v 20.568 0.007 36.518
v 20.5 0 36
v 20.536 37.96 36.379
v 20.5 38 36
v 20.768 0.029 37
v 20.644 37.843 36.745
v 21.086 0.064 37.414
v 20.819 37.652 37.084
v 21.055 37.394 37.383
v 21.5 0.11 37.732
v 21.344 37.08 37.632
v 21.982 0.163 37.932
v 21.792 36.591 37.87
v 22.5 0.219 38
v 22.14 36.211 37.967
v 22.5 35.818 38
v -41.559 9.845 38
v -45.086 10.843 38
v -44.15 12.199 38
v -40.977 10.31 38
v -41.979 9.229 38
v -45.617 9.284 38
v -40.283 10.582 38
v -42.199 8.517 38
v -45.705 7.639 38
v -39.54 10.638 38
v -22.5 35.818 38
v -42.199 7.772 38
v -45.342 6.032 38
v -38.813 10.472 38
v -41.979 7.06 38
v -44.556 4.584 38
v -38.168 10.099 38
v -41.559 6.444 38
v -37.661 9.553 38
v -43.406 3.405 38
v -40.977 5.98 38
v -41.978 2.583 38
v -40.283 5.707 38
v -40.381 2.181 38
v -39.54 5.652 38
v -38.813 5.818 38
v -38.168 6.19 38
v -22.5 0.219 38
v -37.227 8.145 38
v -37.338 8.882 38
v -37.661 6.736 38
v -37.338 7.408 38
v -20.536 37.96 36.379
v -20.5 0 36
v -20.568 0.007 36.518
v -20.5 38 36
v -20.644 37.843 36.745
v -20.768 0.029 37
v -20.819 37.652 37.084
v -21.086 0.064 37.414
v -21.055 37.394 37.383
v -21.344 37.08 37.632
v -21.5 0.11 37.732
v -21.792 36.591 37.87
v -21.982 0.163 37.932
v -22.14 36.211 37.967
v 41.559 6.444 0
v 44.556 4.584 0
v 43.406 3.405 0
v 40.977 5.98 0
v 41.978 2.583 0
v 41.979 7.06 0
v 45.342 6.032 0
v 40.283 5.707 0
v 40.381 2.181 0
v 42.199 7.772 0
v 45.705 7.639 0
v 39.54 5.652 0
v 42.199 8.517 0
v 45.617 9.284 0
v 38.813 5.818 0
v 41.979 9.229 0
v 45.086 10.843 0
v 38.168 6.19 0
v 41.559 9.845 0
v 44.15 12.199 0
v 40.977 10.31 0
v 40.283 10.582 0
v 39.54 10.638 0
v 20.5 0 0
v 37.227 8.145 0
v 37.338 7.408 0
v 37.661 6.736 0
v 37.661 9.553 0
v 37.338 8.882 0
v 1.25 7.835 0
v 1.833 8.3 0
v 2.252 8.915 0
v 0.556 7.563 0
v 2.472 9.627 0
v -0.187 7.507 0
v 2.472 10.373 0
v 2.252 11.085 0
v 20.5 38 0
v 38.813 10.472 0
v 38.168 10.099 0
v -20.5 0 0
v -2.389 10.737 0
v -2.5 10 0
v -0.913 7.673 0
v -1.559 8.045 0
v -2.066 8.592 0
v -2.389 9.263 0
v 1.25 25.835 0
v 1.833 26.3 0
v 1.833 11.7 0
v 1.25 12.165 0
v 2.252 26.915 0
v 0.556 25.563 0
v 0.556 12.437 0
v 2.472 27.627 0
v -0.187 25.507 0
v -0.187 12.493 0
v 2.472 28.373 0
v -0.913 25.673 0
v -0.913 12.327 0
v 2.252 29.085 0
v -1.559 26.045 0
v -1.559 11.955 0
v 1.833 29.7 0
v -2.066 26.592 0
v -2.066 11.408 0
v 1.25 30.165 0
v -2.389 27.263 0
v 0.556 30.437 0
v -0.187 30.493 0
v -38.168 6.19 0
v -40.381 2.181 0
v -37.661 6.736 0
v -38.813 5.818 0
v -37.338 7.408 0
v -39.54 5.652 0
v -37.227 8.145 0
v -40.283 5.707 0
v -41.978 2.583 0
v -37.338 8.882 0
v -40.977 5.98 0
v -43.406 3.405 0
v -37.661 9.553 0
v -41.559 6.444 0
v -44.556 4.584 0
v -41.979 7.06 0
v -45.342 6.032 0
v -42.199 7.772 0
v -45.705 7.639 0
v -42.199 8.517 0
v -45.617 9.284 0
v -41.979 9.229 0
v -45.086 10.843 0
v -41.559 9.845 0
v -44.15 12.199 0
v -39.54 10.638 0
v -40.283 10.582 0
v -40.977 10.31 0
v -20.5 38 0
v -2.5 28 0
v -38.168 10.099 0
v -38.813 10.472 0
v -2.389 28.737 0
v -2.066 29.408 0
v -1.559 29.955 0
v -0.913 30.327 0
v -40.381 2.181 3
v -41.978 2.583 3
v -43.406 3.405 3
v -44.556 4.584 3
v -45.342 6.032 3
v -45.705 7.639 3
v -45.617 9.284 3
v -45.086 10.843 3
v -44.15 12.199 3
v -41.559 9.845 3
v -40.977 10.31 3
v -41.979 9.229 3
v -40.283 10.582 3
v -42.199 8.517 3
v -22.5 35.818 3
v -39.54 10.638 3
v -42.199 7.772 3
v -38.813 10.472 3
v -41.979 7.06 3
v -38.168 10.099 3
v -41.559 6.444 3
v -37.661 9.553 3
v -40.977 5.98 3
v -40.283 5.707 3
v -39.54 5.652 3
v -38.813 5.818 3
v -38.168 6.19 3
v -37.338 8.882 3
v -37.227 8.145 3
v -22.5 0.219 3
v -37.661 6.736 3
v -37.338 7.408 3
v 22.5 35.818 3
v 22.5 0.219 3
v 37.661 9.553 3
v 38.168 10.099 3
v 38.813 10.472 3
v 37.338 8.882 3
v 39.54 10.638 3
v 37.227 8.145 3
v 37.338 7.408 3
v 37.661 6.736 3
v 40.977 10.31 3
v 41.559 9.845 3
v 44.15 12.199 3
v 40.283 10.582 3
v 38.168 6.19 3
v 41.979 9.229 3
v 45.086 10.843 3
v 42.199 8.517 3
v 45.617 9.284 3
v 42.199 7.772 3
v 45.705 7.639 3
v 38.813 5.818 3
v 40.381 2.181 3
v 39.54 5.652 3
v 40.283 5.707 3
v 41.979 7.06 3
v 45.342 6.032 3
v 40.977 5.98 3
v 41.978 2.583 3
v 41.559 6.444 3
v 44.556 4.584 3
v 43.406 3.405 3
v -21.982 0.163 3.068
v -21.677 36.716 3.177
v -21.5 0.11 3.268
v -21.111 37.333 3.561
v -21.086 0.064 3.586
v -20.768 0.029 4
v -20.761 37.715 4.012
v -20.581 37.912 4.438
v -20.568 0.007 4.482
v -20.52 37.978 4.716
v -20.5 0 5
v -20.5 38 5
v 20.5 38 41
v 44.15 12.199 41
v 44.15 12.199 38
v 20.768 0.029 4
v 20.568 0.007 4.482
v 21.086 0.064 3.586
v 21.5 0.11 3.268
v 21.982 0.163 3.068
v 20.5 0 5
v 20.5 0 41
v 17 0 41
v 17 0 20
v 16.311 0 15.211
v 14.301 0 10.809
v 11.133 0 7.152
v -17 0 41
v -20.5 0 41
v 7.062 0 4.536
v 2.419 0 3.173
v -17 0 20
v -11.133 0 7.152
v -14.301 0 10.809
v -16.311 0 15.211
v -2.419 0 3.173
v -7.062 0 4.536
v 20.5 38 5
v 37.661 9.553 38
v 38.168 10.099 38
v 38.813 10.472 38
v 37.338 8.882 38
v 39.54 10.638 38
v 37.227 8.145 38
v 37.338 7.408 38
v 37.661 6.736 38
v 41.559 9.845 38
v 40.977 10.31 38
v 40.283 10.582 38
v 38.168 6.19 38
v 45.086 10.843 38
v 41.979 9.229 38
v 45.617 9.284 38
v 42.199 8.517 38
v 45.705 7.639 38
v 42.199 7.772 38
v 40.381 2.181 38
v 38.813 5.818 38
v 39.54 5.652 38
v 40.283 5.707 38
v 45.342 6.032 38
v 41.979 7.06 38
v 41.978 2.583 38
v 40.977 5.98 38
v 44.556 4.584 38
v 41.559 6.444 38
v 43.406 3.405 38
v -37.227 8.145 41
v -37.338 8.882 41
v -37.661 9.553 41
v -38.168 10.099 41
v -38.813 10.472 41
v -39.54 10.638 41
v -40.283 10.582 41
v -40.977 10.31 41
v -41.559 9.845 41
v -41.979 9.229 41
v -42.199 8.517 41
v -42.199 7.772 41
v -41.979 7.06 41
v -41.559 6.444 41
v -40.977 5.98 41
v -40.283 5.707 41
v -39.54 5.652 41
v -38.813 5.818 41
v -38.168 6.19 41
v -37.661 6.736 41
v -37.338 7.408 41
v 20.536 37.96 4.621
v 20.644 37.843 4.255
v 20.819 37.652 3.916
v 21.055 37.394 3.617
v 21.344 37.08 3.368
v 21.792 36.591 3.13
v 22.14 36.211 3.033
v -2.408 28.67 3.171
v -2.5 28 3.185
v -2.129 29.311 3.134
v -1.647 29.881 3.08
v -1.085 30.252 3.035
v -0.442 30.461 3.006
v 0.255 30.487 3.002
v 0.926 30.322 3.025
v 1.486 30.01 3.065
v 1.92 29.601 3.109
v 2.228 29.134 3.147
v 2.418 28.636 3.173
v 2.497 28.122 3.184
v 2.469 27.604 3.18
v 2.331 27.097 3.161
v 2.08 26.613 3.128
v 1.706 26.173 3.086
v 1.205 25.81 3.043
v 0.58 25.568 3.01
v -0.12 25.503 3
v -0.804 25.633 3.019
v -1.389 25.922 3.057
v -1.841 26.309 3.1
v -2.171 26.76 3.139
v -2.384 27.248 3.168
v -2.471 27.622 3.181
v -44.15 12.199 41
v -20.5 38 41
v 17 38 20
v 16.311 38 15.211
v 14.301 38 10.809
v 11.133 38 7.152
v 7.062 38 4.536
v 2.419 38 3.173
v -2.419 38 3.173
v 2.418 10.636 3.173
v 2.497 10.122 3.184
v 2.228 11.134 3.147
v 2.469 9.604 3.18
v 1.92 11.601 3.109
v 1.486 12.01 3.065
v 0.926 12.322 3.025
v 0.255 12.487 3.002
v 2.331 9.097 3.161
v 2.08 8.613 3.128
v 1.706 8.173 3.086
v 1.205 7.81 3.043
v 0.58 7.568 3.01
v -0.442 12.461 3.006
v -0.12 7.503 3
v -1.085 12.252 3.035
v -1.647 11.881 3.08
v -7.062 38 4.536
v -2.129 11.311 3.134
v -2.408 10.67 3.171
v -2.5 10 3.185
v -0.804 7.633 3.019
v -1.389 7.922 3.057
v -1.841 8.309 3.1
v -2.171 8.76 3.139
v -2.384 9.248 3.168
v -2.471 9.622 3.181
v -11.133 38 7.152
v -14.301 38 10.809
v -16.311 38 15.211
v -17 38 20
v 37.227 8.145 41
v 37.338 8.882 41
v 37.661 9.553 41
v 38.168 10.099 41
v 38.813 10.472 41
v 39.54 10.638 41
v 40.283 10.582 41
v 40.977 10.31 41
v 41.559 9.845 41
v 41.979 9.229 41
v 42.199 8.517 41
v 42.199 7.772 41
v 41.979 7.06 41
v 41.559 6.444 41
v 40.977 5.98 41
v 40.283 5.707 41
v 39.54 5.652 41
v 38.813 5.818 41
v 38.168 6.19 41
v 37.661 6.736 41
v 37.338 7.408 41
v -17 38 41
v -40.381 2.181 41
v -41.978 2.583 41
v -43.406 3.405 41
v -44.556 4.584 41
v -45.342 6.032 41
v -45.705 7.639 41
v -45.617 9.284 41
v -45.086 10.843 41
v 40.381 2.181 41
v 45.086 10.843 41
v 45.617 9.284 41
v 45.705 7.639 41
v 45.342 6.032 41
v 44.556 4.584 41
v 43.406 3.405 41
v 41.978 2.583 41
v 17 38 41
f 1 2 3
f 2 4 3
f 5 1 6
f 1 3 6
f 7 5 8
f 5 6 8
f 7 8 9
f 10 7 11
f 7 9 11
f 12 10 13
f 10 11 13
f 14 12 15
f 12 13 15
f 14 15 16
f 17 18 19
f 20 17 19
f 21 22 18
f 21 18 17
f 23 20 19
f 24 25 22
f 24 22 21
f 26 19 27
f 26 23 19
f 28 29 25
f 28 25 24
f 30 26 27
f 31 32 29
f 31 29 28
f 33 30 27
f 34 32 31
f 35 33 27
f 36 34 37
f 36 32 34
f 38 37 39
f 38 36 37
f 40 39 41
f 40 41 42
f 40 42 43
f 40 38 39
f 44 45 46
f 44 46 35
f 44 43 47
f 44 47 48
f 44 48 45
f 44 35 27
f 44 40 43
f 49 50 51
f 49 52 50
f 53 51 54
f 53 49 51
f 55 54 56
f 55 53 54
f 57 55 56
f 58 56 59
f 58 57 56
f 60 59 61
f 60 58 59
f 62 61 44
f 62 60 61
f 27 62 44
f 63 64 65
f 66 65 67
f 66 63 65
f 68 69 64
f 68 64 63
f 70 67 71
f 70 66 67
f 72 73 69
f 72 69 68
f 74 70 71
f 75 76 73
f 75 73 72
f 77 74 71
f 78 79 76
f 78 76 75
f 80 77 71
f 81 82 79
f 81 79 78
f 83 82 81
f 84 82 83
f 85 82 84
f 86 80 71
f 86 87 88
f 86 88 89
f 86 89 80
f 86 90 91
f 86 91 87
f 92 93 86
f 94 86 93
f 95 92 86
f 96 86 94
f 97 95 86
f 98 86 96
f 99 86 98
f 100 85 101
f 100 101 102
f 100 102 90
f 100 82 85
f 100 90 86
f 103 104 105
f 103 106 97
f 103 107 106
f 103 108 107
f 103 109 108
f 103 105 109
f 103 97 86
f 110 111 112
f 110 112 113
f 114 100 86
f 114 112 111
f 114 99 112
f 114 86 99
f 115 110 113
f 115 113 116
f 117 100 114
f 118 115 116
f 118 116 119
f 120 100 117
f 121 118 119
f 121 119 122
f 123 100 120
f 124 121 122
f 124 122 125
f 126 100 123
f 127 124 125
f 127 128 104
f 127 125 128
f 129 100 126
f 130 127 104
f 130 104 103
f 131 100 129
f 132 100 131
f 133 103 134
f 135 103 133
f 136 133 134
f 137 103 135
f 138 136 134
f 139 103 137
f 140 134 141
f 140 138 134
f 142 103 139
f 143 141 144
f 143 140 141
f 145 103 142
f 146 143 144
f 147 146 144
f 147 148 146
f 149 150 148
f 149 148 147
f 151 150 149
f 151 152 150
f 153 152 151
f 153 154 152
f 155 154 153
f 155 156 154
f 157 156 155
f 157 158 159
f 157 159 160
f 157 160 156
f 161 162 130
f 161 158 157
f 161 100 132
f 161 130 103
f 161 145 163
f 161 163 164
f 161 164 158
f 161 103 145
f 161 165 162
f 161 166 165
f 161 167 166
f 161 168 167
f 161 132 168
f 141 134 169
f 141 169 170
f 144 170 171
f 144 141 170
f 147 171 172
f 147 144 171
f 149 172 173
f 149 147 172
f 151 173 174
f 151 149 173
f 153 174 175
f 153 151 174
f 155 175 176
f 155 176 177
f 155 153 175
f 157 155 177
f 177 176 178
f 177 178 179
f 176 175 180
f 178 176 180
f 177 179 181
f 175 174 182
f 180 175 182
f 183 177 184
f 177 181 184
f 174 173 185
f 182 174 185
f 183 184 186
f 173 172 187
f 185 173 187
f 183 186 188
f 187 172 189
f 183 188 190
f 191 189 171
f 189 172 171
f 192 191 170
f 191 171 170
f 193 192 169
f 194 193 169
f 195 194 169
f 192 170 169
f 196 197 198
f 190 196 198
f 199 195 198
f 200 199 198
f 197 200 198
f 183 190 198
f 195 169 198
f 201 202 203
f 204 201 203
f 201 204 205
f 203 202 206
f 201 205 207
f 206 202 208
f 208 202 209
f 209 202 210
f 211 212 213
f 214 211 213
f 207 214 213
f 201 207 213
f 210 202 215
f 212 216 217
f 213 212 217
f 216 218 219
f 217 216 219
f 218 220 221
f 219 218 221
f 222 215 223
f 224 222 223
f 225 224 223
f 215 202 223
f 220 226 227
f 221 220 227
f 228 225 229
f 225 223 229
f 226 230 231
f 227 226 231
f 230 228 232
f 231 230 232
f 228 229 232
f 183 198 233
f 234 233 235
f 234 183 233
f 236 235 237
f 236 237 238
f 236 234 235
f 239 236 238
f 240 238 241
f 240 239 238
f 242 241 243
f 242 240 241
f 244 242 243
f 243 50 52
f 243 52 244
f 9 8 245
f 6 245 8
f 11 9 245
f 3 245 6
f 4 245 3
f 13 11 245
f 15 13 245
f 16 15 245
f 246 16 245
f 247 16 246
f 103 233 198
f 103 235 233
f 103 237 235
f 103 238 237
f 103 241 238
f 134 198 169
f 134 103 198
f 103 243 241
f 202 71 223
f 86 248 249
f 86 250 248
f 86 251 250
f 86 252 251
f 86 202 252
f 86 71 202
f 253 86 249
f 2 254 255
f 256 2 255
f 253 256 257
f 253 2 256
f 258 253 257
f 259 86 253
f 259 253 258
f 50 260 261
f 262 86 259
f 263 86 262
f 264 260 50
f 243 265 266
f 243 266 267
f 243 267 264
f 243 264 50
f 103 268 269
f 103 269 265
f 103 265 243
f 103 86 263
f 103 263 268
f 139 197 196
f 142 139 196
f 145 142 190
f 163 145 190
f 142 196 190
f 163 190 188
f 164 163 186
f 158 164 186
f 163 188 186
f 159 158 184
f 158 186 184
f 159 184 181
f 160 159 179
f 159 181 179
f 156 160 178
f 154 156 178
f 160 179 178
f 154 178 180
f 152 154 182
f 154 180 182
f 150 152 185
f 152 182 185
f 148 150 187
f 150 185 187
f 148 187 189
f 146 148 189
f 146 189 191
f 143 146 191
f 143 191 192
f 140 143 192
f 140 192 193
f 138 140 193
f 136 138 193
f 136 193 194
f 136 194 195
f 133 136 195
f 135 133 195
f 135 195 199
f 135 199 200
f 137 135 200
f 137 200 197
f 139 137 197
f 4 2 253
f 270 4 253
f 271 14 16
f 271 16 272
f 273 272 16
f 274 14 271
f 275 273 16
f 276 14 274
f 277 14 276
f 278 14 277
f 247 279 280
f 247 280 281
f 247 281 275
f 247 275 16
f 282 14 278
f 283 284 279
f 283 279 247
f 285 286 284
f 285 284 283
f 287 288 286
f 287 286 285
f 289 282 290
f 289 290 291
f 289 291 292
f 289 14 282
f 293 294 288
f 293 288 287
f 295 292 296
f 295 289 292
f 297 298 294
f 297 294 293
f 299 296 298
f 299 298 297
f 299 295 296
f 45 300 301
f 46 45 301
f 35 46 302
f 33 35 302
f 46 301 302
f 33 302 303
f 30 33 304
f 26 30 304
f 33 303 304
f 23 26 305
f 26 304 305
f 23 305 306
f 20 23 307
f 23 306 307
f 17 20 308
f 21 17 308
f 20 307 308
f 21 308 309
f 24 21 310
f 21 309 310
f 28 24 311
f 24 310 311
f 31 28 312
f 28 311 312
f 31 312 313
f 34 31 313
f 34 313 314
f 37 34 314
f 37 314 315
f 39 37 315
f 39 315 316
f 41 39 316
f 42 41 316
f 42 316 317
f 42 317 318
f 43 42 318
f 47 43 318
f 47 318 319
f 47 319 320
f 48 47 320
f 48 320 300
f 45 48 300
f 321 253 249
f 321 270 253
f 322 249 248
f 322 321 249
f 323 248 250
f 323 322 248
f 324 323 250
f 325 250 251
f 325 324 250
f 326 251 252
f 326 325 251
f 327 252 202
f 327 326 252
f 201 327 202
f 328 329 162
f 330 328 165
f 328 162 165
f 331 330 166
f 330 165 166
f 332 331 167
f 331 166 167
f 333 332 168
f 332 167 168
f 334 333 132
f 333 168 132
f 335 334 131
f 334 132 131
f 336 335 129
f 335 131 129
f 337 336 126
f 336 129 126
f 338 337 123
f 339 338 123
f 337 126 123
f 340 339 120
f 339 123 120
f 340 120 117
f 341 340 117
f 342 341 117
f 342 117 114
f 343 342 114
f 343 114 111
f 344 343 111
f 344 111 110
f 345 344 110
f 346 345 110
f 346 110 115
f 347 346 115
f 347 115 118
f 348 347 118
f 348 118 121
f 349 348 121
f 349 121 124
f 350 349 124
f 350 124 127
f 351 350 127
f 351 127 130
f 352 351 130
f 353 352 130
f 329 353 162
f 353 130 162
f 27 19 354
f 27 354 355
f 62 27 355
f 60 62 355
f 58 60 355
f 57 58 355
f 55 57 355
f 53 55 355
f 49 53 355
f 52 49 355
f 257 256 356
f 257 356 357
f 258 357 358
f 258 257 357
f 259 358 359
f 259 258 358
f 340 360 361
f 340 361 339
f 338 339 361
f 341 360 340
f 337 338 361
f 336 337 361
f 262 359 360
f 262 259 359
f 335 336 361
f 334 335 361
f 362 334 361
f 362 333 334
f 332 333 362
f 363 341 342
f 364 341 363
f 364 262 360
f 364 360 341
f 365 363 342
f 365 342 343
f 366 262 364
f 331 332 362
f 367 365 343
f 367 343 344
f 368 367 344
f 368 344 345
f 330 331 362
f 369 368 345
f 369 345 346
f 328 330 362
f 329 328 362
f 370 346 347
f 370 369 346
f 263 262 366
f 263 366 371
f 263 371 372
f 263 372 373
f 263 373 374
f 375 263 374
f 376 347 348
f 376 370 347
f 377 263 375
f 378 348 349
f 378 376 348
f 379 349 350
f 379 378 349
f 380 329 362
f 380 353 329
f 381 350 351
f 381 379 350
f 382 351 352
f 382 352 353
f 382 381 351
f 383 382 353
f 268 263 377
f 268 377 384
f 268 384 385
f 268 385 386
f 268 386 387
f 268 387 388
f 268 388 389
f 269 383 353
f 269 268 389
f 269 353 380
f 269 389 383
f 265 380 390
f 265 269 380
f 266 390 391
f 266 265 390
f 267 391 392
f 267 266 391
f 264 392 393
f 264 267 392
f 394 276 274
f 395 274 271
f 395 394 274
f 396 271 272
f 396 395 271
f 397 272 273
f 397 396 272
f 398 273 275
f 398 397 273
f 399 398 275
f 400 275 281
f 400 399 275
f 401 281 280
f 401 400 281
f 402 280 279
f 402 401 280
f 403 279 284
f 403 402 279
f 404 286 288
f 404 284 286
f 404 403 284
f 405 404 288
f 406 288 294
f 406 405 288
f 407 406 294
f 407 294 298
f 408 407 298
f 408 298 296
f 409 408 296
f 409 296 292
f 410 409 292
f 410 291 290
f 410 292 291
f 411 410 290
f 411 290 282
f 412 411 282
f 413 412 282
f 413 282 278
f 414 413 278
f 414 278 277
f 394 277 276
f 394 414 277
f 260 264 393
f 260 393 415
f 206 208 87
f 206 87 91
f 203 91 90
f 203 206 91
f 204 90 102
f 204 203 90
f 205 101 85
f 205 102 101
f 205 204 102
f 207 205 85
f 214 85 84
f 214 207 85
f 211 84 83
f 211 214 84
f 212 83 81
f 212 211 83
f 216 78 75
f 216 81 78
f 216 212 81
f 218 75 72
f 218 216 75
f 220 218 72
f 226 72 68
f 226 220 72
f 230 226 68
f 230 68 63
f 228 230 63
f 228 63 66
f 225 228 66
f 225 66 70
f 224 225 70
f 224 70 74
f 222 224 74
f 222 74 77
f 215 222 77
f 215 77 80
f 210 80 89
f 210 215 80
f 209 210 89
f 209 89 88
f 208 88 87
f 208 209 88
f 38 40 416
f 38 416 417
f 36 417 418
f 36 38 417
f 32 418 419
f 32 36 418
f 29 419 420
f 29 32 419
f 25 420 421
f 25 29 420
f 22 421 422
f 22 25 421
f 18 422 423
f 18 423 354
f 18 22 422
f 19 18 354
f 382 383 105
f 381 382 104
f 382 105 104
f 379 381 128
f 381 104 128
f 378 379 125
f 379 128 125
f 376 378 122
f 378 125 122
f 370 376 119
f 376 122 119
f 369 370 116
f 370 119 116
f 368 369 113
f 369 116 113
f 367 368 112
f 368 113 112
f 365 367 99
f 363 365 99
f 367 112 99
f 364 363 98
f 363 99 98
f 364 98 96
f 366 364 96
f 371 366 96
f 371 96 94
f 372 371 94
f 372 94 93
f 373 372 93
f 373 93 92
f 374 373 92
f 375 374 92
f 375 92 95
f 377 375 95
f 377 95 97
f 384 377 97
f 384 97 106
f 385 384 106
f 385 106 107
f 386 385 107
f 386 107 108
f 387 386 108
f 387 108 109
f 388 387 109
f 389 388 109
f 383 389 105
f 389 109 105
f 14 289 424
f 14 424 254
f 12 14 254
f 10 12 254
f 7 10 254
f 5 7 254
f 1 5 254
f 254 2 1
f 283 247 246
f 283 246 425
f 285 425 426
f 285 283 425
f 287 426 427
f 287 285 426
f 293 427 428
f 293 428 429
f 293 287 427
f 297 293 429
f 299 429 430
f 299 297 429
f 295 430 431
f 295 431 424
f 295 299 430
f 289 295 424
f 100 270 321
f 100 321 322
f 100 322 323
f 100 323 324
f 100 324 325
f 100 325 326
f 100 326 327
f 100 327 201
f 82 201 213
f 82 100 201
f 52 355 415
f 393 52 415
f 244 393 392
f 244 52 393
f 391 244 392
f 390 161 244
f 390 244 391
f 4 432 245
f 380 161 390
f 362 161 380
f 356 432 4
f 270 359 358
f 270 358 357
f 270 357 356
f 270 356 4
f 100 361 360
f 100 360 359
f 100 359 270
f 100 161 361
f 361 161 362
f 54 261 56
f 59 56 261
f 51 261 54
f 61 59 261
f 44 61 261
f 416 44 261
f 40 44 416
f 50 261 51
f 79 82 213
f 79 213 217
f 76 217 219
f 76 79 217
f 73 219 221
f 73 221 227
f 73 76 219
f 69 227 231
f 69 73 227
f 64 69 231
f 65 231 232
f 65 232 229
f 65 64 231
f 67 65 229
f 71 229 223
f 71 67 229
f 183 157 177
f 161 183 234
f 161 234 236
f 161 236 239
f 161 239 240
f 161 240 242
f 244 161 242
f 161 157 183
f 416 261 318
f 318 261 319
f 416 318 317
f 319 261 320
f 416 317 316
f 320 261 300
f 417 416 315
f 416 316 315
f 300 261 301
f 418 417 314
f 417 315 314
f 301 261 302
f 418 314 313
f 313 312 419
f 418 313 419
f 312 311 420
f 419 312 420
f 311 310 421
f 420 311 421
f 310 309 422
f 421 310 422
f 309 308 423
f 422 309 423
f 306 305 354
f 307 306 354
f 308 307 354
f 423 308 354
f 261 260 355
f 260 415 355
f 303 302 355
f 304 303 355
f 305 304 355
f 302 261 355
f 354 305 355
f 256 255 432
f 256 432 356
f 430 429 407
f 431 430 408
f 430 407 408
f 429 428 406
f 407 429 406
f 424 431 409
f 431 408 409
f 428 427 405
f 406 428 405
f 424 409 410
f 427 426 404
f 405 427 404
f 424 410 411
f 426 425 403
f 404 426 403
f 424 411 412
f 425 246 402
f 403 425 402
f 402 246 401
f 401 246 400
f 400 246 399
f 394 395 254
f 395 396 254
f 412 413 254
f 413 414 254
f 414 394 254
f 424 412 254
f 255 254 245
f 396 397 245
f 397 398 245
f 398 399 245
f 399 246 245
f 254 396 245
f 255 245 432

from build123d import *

# Parameters (mm, degrees)
BOSS_EXTRUDE1_DEPTH     = 41
SKETCH3_W               = 25.226628976
SKETCH3_H               = 35
CUT_EXTRUDE2_DEPTH      = 39
CUT_EXTRUDE2_DEPTH_BACK = 1
CUT_EXTRUDE3_DEPTH      = 39
SKETCH5_R               = 2.5
CUT_EXTRUDE4_DEPTH      = 42
SKETCH6_R               = 2.5
CUT_EXTRUDE5_DEPTH      = 42.0000001
FILLET1_R               = 2


with BuildPart() as part:
    # Sketch1 → Boss-Extrude1 (new body)
    with BuildSketch(Plane.XY):
        with BuildLine():
            Line((-20.5, 0), (-40.380779843, 2.180502889))
            ThreePointArc((-40.380779843, 2.180502889), (-45.342396797, 6.03211956), (-44.149663567, 12.198964882))
            Line((-44.149663567, 12.198964882), (-20.5, 38))
            Line((-20.5, 38), (20.5, 38))
            Line((20.5, 38), (44.149663567, 12.198964882))
            ThreePointArc((44.149663567, 12.198964882), (45.342396797, 6.03211956), (40.380779843, 2.180502889))
            Line((40.380779843, 2.180502889), (20.5, 0))
            Line((20.5, 0), (-20.5, 0))
        make_face()
    extrude(amount=BOSS_EXTRUDE1_DEPTH)

    # Sketch3 → Cut-Extrude2 (cut, two sides)
    with BuildSketch(Plane(origin=(0, 0, 0), x_dir=(1, 0, 0), z_dir=(0, 1, 0))) as cut_extrude2_sk:
        with Locations((33.113314488, -20.5)):
            Rectangle(SKETCH3_W, SKETCH3_H)
        with Locations((-33.113314488, -20.5)):
            Rectangle(SKETCH3_W, SKETCH3_H)
    extrude(amount=CUT_EXTRUDE2_DEPTH, mode=Mode.SUBTRACT)
    extrude(cut_extrude2_sk.sketch, amount=-CUT_EXTRUDE2_DEPTH_BACK, mode=Mode.SUBTRACT)

    # Sketch4 → Cut-Extrude3 (cut, through all)
    with BuildSketch(Plane.XZ):
        with BuildLine():
            Line((-17, 20), (-17, 41))
            Line((-17, 41), (17, 41))
            Line((17, 41), (17, 20))
            ThreePointArc((17, 20), (0, 3), (-17, 20))
        make_face()
    extrude(amount=-CUT_EXTRUDE3_DEPTH, mode=Mode.SUBTRACT)

    # Sketch5 → Cut-Extrude4 (cut, through all)
    with BuildSketch(Plane(origin=(0, 0, 0), x_dir=(-1, 0, 0), z_dir=(0, 0, -1))):
        with Locations((0, 28)):
            Circle(SKETCH5_R)
        with Locations((0, 10)):
            Circle(SKETCH5_R)
    extrude(amount=-CUT_EXTRUDE4_DEPTH, mode=Mode.SUBTRACT)

    # Sketch6 → Cut-Extrude5 (cut, through all)
    with BuildSketch(Plane.XY.offset(41)):
        with Locations((-39.726628976, 8.144736842)):
            Circle(SKETCH6_R)
    cut_extrude5 = extrude(amount=-CUT_EXTRUDE5_DEPTH, mode=Mode.SUBTRACT)

    # Mirror1: Cut-Extrude5 across plane
    add(cut_extrude5.mirror(Plane(origin=(0, 0, 0), x_dir=(0, 0, 1), z_dir=(1, 0, 0))), mode=Mode.SUBTRACT)

    # Fillet1
    fillet1_edges = [part.edges().sort_by_distance(p)[0] for p in [
        (20.5, 19, 3),
        (20.5, 19, 38),
        (-20.5, 19, 38),
        (-20.5, 19, 3),
    ]]
    fillet(fillet1_edges, radius=FILLET1_R)


solid = part.part
